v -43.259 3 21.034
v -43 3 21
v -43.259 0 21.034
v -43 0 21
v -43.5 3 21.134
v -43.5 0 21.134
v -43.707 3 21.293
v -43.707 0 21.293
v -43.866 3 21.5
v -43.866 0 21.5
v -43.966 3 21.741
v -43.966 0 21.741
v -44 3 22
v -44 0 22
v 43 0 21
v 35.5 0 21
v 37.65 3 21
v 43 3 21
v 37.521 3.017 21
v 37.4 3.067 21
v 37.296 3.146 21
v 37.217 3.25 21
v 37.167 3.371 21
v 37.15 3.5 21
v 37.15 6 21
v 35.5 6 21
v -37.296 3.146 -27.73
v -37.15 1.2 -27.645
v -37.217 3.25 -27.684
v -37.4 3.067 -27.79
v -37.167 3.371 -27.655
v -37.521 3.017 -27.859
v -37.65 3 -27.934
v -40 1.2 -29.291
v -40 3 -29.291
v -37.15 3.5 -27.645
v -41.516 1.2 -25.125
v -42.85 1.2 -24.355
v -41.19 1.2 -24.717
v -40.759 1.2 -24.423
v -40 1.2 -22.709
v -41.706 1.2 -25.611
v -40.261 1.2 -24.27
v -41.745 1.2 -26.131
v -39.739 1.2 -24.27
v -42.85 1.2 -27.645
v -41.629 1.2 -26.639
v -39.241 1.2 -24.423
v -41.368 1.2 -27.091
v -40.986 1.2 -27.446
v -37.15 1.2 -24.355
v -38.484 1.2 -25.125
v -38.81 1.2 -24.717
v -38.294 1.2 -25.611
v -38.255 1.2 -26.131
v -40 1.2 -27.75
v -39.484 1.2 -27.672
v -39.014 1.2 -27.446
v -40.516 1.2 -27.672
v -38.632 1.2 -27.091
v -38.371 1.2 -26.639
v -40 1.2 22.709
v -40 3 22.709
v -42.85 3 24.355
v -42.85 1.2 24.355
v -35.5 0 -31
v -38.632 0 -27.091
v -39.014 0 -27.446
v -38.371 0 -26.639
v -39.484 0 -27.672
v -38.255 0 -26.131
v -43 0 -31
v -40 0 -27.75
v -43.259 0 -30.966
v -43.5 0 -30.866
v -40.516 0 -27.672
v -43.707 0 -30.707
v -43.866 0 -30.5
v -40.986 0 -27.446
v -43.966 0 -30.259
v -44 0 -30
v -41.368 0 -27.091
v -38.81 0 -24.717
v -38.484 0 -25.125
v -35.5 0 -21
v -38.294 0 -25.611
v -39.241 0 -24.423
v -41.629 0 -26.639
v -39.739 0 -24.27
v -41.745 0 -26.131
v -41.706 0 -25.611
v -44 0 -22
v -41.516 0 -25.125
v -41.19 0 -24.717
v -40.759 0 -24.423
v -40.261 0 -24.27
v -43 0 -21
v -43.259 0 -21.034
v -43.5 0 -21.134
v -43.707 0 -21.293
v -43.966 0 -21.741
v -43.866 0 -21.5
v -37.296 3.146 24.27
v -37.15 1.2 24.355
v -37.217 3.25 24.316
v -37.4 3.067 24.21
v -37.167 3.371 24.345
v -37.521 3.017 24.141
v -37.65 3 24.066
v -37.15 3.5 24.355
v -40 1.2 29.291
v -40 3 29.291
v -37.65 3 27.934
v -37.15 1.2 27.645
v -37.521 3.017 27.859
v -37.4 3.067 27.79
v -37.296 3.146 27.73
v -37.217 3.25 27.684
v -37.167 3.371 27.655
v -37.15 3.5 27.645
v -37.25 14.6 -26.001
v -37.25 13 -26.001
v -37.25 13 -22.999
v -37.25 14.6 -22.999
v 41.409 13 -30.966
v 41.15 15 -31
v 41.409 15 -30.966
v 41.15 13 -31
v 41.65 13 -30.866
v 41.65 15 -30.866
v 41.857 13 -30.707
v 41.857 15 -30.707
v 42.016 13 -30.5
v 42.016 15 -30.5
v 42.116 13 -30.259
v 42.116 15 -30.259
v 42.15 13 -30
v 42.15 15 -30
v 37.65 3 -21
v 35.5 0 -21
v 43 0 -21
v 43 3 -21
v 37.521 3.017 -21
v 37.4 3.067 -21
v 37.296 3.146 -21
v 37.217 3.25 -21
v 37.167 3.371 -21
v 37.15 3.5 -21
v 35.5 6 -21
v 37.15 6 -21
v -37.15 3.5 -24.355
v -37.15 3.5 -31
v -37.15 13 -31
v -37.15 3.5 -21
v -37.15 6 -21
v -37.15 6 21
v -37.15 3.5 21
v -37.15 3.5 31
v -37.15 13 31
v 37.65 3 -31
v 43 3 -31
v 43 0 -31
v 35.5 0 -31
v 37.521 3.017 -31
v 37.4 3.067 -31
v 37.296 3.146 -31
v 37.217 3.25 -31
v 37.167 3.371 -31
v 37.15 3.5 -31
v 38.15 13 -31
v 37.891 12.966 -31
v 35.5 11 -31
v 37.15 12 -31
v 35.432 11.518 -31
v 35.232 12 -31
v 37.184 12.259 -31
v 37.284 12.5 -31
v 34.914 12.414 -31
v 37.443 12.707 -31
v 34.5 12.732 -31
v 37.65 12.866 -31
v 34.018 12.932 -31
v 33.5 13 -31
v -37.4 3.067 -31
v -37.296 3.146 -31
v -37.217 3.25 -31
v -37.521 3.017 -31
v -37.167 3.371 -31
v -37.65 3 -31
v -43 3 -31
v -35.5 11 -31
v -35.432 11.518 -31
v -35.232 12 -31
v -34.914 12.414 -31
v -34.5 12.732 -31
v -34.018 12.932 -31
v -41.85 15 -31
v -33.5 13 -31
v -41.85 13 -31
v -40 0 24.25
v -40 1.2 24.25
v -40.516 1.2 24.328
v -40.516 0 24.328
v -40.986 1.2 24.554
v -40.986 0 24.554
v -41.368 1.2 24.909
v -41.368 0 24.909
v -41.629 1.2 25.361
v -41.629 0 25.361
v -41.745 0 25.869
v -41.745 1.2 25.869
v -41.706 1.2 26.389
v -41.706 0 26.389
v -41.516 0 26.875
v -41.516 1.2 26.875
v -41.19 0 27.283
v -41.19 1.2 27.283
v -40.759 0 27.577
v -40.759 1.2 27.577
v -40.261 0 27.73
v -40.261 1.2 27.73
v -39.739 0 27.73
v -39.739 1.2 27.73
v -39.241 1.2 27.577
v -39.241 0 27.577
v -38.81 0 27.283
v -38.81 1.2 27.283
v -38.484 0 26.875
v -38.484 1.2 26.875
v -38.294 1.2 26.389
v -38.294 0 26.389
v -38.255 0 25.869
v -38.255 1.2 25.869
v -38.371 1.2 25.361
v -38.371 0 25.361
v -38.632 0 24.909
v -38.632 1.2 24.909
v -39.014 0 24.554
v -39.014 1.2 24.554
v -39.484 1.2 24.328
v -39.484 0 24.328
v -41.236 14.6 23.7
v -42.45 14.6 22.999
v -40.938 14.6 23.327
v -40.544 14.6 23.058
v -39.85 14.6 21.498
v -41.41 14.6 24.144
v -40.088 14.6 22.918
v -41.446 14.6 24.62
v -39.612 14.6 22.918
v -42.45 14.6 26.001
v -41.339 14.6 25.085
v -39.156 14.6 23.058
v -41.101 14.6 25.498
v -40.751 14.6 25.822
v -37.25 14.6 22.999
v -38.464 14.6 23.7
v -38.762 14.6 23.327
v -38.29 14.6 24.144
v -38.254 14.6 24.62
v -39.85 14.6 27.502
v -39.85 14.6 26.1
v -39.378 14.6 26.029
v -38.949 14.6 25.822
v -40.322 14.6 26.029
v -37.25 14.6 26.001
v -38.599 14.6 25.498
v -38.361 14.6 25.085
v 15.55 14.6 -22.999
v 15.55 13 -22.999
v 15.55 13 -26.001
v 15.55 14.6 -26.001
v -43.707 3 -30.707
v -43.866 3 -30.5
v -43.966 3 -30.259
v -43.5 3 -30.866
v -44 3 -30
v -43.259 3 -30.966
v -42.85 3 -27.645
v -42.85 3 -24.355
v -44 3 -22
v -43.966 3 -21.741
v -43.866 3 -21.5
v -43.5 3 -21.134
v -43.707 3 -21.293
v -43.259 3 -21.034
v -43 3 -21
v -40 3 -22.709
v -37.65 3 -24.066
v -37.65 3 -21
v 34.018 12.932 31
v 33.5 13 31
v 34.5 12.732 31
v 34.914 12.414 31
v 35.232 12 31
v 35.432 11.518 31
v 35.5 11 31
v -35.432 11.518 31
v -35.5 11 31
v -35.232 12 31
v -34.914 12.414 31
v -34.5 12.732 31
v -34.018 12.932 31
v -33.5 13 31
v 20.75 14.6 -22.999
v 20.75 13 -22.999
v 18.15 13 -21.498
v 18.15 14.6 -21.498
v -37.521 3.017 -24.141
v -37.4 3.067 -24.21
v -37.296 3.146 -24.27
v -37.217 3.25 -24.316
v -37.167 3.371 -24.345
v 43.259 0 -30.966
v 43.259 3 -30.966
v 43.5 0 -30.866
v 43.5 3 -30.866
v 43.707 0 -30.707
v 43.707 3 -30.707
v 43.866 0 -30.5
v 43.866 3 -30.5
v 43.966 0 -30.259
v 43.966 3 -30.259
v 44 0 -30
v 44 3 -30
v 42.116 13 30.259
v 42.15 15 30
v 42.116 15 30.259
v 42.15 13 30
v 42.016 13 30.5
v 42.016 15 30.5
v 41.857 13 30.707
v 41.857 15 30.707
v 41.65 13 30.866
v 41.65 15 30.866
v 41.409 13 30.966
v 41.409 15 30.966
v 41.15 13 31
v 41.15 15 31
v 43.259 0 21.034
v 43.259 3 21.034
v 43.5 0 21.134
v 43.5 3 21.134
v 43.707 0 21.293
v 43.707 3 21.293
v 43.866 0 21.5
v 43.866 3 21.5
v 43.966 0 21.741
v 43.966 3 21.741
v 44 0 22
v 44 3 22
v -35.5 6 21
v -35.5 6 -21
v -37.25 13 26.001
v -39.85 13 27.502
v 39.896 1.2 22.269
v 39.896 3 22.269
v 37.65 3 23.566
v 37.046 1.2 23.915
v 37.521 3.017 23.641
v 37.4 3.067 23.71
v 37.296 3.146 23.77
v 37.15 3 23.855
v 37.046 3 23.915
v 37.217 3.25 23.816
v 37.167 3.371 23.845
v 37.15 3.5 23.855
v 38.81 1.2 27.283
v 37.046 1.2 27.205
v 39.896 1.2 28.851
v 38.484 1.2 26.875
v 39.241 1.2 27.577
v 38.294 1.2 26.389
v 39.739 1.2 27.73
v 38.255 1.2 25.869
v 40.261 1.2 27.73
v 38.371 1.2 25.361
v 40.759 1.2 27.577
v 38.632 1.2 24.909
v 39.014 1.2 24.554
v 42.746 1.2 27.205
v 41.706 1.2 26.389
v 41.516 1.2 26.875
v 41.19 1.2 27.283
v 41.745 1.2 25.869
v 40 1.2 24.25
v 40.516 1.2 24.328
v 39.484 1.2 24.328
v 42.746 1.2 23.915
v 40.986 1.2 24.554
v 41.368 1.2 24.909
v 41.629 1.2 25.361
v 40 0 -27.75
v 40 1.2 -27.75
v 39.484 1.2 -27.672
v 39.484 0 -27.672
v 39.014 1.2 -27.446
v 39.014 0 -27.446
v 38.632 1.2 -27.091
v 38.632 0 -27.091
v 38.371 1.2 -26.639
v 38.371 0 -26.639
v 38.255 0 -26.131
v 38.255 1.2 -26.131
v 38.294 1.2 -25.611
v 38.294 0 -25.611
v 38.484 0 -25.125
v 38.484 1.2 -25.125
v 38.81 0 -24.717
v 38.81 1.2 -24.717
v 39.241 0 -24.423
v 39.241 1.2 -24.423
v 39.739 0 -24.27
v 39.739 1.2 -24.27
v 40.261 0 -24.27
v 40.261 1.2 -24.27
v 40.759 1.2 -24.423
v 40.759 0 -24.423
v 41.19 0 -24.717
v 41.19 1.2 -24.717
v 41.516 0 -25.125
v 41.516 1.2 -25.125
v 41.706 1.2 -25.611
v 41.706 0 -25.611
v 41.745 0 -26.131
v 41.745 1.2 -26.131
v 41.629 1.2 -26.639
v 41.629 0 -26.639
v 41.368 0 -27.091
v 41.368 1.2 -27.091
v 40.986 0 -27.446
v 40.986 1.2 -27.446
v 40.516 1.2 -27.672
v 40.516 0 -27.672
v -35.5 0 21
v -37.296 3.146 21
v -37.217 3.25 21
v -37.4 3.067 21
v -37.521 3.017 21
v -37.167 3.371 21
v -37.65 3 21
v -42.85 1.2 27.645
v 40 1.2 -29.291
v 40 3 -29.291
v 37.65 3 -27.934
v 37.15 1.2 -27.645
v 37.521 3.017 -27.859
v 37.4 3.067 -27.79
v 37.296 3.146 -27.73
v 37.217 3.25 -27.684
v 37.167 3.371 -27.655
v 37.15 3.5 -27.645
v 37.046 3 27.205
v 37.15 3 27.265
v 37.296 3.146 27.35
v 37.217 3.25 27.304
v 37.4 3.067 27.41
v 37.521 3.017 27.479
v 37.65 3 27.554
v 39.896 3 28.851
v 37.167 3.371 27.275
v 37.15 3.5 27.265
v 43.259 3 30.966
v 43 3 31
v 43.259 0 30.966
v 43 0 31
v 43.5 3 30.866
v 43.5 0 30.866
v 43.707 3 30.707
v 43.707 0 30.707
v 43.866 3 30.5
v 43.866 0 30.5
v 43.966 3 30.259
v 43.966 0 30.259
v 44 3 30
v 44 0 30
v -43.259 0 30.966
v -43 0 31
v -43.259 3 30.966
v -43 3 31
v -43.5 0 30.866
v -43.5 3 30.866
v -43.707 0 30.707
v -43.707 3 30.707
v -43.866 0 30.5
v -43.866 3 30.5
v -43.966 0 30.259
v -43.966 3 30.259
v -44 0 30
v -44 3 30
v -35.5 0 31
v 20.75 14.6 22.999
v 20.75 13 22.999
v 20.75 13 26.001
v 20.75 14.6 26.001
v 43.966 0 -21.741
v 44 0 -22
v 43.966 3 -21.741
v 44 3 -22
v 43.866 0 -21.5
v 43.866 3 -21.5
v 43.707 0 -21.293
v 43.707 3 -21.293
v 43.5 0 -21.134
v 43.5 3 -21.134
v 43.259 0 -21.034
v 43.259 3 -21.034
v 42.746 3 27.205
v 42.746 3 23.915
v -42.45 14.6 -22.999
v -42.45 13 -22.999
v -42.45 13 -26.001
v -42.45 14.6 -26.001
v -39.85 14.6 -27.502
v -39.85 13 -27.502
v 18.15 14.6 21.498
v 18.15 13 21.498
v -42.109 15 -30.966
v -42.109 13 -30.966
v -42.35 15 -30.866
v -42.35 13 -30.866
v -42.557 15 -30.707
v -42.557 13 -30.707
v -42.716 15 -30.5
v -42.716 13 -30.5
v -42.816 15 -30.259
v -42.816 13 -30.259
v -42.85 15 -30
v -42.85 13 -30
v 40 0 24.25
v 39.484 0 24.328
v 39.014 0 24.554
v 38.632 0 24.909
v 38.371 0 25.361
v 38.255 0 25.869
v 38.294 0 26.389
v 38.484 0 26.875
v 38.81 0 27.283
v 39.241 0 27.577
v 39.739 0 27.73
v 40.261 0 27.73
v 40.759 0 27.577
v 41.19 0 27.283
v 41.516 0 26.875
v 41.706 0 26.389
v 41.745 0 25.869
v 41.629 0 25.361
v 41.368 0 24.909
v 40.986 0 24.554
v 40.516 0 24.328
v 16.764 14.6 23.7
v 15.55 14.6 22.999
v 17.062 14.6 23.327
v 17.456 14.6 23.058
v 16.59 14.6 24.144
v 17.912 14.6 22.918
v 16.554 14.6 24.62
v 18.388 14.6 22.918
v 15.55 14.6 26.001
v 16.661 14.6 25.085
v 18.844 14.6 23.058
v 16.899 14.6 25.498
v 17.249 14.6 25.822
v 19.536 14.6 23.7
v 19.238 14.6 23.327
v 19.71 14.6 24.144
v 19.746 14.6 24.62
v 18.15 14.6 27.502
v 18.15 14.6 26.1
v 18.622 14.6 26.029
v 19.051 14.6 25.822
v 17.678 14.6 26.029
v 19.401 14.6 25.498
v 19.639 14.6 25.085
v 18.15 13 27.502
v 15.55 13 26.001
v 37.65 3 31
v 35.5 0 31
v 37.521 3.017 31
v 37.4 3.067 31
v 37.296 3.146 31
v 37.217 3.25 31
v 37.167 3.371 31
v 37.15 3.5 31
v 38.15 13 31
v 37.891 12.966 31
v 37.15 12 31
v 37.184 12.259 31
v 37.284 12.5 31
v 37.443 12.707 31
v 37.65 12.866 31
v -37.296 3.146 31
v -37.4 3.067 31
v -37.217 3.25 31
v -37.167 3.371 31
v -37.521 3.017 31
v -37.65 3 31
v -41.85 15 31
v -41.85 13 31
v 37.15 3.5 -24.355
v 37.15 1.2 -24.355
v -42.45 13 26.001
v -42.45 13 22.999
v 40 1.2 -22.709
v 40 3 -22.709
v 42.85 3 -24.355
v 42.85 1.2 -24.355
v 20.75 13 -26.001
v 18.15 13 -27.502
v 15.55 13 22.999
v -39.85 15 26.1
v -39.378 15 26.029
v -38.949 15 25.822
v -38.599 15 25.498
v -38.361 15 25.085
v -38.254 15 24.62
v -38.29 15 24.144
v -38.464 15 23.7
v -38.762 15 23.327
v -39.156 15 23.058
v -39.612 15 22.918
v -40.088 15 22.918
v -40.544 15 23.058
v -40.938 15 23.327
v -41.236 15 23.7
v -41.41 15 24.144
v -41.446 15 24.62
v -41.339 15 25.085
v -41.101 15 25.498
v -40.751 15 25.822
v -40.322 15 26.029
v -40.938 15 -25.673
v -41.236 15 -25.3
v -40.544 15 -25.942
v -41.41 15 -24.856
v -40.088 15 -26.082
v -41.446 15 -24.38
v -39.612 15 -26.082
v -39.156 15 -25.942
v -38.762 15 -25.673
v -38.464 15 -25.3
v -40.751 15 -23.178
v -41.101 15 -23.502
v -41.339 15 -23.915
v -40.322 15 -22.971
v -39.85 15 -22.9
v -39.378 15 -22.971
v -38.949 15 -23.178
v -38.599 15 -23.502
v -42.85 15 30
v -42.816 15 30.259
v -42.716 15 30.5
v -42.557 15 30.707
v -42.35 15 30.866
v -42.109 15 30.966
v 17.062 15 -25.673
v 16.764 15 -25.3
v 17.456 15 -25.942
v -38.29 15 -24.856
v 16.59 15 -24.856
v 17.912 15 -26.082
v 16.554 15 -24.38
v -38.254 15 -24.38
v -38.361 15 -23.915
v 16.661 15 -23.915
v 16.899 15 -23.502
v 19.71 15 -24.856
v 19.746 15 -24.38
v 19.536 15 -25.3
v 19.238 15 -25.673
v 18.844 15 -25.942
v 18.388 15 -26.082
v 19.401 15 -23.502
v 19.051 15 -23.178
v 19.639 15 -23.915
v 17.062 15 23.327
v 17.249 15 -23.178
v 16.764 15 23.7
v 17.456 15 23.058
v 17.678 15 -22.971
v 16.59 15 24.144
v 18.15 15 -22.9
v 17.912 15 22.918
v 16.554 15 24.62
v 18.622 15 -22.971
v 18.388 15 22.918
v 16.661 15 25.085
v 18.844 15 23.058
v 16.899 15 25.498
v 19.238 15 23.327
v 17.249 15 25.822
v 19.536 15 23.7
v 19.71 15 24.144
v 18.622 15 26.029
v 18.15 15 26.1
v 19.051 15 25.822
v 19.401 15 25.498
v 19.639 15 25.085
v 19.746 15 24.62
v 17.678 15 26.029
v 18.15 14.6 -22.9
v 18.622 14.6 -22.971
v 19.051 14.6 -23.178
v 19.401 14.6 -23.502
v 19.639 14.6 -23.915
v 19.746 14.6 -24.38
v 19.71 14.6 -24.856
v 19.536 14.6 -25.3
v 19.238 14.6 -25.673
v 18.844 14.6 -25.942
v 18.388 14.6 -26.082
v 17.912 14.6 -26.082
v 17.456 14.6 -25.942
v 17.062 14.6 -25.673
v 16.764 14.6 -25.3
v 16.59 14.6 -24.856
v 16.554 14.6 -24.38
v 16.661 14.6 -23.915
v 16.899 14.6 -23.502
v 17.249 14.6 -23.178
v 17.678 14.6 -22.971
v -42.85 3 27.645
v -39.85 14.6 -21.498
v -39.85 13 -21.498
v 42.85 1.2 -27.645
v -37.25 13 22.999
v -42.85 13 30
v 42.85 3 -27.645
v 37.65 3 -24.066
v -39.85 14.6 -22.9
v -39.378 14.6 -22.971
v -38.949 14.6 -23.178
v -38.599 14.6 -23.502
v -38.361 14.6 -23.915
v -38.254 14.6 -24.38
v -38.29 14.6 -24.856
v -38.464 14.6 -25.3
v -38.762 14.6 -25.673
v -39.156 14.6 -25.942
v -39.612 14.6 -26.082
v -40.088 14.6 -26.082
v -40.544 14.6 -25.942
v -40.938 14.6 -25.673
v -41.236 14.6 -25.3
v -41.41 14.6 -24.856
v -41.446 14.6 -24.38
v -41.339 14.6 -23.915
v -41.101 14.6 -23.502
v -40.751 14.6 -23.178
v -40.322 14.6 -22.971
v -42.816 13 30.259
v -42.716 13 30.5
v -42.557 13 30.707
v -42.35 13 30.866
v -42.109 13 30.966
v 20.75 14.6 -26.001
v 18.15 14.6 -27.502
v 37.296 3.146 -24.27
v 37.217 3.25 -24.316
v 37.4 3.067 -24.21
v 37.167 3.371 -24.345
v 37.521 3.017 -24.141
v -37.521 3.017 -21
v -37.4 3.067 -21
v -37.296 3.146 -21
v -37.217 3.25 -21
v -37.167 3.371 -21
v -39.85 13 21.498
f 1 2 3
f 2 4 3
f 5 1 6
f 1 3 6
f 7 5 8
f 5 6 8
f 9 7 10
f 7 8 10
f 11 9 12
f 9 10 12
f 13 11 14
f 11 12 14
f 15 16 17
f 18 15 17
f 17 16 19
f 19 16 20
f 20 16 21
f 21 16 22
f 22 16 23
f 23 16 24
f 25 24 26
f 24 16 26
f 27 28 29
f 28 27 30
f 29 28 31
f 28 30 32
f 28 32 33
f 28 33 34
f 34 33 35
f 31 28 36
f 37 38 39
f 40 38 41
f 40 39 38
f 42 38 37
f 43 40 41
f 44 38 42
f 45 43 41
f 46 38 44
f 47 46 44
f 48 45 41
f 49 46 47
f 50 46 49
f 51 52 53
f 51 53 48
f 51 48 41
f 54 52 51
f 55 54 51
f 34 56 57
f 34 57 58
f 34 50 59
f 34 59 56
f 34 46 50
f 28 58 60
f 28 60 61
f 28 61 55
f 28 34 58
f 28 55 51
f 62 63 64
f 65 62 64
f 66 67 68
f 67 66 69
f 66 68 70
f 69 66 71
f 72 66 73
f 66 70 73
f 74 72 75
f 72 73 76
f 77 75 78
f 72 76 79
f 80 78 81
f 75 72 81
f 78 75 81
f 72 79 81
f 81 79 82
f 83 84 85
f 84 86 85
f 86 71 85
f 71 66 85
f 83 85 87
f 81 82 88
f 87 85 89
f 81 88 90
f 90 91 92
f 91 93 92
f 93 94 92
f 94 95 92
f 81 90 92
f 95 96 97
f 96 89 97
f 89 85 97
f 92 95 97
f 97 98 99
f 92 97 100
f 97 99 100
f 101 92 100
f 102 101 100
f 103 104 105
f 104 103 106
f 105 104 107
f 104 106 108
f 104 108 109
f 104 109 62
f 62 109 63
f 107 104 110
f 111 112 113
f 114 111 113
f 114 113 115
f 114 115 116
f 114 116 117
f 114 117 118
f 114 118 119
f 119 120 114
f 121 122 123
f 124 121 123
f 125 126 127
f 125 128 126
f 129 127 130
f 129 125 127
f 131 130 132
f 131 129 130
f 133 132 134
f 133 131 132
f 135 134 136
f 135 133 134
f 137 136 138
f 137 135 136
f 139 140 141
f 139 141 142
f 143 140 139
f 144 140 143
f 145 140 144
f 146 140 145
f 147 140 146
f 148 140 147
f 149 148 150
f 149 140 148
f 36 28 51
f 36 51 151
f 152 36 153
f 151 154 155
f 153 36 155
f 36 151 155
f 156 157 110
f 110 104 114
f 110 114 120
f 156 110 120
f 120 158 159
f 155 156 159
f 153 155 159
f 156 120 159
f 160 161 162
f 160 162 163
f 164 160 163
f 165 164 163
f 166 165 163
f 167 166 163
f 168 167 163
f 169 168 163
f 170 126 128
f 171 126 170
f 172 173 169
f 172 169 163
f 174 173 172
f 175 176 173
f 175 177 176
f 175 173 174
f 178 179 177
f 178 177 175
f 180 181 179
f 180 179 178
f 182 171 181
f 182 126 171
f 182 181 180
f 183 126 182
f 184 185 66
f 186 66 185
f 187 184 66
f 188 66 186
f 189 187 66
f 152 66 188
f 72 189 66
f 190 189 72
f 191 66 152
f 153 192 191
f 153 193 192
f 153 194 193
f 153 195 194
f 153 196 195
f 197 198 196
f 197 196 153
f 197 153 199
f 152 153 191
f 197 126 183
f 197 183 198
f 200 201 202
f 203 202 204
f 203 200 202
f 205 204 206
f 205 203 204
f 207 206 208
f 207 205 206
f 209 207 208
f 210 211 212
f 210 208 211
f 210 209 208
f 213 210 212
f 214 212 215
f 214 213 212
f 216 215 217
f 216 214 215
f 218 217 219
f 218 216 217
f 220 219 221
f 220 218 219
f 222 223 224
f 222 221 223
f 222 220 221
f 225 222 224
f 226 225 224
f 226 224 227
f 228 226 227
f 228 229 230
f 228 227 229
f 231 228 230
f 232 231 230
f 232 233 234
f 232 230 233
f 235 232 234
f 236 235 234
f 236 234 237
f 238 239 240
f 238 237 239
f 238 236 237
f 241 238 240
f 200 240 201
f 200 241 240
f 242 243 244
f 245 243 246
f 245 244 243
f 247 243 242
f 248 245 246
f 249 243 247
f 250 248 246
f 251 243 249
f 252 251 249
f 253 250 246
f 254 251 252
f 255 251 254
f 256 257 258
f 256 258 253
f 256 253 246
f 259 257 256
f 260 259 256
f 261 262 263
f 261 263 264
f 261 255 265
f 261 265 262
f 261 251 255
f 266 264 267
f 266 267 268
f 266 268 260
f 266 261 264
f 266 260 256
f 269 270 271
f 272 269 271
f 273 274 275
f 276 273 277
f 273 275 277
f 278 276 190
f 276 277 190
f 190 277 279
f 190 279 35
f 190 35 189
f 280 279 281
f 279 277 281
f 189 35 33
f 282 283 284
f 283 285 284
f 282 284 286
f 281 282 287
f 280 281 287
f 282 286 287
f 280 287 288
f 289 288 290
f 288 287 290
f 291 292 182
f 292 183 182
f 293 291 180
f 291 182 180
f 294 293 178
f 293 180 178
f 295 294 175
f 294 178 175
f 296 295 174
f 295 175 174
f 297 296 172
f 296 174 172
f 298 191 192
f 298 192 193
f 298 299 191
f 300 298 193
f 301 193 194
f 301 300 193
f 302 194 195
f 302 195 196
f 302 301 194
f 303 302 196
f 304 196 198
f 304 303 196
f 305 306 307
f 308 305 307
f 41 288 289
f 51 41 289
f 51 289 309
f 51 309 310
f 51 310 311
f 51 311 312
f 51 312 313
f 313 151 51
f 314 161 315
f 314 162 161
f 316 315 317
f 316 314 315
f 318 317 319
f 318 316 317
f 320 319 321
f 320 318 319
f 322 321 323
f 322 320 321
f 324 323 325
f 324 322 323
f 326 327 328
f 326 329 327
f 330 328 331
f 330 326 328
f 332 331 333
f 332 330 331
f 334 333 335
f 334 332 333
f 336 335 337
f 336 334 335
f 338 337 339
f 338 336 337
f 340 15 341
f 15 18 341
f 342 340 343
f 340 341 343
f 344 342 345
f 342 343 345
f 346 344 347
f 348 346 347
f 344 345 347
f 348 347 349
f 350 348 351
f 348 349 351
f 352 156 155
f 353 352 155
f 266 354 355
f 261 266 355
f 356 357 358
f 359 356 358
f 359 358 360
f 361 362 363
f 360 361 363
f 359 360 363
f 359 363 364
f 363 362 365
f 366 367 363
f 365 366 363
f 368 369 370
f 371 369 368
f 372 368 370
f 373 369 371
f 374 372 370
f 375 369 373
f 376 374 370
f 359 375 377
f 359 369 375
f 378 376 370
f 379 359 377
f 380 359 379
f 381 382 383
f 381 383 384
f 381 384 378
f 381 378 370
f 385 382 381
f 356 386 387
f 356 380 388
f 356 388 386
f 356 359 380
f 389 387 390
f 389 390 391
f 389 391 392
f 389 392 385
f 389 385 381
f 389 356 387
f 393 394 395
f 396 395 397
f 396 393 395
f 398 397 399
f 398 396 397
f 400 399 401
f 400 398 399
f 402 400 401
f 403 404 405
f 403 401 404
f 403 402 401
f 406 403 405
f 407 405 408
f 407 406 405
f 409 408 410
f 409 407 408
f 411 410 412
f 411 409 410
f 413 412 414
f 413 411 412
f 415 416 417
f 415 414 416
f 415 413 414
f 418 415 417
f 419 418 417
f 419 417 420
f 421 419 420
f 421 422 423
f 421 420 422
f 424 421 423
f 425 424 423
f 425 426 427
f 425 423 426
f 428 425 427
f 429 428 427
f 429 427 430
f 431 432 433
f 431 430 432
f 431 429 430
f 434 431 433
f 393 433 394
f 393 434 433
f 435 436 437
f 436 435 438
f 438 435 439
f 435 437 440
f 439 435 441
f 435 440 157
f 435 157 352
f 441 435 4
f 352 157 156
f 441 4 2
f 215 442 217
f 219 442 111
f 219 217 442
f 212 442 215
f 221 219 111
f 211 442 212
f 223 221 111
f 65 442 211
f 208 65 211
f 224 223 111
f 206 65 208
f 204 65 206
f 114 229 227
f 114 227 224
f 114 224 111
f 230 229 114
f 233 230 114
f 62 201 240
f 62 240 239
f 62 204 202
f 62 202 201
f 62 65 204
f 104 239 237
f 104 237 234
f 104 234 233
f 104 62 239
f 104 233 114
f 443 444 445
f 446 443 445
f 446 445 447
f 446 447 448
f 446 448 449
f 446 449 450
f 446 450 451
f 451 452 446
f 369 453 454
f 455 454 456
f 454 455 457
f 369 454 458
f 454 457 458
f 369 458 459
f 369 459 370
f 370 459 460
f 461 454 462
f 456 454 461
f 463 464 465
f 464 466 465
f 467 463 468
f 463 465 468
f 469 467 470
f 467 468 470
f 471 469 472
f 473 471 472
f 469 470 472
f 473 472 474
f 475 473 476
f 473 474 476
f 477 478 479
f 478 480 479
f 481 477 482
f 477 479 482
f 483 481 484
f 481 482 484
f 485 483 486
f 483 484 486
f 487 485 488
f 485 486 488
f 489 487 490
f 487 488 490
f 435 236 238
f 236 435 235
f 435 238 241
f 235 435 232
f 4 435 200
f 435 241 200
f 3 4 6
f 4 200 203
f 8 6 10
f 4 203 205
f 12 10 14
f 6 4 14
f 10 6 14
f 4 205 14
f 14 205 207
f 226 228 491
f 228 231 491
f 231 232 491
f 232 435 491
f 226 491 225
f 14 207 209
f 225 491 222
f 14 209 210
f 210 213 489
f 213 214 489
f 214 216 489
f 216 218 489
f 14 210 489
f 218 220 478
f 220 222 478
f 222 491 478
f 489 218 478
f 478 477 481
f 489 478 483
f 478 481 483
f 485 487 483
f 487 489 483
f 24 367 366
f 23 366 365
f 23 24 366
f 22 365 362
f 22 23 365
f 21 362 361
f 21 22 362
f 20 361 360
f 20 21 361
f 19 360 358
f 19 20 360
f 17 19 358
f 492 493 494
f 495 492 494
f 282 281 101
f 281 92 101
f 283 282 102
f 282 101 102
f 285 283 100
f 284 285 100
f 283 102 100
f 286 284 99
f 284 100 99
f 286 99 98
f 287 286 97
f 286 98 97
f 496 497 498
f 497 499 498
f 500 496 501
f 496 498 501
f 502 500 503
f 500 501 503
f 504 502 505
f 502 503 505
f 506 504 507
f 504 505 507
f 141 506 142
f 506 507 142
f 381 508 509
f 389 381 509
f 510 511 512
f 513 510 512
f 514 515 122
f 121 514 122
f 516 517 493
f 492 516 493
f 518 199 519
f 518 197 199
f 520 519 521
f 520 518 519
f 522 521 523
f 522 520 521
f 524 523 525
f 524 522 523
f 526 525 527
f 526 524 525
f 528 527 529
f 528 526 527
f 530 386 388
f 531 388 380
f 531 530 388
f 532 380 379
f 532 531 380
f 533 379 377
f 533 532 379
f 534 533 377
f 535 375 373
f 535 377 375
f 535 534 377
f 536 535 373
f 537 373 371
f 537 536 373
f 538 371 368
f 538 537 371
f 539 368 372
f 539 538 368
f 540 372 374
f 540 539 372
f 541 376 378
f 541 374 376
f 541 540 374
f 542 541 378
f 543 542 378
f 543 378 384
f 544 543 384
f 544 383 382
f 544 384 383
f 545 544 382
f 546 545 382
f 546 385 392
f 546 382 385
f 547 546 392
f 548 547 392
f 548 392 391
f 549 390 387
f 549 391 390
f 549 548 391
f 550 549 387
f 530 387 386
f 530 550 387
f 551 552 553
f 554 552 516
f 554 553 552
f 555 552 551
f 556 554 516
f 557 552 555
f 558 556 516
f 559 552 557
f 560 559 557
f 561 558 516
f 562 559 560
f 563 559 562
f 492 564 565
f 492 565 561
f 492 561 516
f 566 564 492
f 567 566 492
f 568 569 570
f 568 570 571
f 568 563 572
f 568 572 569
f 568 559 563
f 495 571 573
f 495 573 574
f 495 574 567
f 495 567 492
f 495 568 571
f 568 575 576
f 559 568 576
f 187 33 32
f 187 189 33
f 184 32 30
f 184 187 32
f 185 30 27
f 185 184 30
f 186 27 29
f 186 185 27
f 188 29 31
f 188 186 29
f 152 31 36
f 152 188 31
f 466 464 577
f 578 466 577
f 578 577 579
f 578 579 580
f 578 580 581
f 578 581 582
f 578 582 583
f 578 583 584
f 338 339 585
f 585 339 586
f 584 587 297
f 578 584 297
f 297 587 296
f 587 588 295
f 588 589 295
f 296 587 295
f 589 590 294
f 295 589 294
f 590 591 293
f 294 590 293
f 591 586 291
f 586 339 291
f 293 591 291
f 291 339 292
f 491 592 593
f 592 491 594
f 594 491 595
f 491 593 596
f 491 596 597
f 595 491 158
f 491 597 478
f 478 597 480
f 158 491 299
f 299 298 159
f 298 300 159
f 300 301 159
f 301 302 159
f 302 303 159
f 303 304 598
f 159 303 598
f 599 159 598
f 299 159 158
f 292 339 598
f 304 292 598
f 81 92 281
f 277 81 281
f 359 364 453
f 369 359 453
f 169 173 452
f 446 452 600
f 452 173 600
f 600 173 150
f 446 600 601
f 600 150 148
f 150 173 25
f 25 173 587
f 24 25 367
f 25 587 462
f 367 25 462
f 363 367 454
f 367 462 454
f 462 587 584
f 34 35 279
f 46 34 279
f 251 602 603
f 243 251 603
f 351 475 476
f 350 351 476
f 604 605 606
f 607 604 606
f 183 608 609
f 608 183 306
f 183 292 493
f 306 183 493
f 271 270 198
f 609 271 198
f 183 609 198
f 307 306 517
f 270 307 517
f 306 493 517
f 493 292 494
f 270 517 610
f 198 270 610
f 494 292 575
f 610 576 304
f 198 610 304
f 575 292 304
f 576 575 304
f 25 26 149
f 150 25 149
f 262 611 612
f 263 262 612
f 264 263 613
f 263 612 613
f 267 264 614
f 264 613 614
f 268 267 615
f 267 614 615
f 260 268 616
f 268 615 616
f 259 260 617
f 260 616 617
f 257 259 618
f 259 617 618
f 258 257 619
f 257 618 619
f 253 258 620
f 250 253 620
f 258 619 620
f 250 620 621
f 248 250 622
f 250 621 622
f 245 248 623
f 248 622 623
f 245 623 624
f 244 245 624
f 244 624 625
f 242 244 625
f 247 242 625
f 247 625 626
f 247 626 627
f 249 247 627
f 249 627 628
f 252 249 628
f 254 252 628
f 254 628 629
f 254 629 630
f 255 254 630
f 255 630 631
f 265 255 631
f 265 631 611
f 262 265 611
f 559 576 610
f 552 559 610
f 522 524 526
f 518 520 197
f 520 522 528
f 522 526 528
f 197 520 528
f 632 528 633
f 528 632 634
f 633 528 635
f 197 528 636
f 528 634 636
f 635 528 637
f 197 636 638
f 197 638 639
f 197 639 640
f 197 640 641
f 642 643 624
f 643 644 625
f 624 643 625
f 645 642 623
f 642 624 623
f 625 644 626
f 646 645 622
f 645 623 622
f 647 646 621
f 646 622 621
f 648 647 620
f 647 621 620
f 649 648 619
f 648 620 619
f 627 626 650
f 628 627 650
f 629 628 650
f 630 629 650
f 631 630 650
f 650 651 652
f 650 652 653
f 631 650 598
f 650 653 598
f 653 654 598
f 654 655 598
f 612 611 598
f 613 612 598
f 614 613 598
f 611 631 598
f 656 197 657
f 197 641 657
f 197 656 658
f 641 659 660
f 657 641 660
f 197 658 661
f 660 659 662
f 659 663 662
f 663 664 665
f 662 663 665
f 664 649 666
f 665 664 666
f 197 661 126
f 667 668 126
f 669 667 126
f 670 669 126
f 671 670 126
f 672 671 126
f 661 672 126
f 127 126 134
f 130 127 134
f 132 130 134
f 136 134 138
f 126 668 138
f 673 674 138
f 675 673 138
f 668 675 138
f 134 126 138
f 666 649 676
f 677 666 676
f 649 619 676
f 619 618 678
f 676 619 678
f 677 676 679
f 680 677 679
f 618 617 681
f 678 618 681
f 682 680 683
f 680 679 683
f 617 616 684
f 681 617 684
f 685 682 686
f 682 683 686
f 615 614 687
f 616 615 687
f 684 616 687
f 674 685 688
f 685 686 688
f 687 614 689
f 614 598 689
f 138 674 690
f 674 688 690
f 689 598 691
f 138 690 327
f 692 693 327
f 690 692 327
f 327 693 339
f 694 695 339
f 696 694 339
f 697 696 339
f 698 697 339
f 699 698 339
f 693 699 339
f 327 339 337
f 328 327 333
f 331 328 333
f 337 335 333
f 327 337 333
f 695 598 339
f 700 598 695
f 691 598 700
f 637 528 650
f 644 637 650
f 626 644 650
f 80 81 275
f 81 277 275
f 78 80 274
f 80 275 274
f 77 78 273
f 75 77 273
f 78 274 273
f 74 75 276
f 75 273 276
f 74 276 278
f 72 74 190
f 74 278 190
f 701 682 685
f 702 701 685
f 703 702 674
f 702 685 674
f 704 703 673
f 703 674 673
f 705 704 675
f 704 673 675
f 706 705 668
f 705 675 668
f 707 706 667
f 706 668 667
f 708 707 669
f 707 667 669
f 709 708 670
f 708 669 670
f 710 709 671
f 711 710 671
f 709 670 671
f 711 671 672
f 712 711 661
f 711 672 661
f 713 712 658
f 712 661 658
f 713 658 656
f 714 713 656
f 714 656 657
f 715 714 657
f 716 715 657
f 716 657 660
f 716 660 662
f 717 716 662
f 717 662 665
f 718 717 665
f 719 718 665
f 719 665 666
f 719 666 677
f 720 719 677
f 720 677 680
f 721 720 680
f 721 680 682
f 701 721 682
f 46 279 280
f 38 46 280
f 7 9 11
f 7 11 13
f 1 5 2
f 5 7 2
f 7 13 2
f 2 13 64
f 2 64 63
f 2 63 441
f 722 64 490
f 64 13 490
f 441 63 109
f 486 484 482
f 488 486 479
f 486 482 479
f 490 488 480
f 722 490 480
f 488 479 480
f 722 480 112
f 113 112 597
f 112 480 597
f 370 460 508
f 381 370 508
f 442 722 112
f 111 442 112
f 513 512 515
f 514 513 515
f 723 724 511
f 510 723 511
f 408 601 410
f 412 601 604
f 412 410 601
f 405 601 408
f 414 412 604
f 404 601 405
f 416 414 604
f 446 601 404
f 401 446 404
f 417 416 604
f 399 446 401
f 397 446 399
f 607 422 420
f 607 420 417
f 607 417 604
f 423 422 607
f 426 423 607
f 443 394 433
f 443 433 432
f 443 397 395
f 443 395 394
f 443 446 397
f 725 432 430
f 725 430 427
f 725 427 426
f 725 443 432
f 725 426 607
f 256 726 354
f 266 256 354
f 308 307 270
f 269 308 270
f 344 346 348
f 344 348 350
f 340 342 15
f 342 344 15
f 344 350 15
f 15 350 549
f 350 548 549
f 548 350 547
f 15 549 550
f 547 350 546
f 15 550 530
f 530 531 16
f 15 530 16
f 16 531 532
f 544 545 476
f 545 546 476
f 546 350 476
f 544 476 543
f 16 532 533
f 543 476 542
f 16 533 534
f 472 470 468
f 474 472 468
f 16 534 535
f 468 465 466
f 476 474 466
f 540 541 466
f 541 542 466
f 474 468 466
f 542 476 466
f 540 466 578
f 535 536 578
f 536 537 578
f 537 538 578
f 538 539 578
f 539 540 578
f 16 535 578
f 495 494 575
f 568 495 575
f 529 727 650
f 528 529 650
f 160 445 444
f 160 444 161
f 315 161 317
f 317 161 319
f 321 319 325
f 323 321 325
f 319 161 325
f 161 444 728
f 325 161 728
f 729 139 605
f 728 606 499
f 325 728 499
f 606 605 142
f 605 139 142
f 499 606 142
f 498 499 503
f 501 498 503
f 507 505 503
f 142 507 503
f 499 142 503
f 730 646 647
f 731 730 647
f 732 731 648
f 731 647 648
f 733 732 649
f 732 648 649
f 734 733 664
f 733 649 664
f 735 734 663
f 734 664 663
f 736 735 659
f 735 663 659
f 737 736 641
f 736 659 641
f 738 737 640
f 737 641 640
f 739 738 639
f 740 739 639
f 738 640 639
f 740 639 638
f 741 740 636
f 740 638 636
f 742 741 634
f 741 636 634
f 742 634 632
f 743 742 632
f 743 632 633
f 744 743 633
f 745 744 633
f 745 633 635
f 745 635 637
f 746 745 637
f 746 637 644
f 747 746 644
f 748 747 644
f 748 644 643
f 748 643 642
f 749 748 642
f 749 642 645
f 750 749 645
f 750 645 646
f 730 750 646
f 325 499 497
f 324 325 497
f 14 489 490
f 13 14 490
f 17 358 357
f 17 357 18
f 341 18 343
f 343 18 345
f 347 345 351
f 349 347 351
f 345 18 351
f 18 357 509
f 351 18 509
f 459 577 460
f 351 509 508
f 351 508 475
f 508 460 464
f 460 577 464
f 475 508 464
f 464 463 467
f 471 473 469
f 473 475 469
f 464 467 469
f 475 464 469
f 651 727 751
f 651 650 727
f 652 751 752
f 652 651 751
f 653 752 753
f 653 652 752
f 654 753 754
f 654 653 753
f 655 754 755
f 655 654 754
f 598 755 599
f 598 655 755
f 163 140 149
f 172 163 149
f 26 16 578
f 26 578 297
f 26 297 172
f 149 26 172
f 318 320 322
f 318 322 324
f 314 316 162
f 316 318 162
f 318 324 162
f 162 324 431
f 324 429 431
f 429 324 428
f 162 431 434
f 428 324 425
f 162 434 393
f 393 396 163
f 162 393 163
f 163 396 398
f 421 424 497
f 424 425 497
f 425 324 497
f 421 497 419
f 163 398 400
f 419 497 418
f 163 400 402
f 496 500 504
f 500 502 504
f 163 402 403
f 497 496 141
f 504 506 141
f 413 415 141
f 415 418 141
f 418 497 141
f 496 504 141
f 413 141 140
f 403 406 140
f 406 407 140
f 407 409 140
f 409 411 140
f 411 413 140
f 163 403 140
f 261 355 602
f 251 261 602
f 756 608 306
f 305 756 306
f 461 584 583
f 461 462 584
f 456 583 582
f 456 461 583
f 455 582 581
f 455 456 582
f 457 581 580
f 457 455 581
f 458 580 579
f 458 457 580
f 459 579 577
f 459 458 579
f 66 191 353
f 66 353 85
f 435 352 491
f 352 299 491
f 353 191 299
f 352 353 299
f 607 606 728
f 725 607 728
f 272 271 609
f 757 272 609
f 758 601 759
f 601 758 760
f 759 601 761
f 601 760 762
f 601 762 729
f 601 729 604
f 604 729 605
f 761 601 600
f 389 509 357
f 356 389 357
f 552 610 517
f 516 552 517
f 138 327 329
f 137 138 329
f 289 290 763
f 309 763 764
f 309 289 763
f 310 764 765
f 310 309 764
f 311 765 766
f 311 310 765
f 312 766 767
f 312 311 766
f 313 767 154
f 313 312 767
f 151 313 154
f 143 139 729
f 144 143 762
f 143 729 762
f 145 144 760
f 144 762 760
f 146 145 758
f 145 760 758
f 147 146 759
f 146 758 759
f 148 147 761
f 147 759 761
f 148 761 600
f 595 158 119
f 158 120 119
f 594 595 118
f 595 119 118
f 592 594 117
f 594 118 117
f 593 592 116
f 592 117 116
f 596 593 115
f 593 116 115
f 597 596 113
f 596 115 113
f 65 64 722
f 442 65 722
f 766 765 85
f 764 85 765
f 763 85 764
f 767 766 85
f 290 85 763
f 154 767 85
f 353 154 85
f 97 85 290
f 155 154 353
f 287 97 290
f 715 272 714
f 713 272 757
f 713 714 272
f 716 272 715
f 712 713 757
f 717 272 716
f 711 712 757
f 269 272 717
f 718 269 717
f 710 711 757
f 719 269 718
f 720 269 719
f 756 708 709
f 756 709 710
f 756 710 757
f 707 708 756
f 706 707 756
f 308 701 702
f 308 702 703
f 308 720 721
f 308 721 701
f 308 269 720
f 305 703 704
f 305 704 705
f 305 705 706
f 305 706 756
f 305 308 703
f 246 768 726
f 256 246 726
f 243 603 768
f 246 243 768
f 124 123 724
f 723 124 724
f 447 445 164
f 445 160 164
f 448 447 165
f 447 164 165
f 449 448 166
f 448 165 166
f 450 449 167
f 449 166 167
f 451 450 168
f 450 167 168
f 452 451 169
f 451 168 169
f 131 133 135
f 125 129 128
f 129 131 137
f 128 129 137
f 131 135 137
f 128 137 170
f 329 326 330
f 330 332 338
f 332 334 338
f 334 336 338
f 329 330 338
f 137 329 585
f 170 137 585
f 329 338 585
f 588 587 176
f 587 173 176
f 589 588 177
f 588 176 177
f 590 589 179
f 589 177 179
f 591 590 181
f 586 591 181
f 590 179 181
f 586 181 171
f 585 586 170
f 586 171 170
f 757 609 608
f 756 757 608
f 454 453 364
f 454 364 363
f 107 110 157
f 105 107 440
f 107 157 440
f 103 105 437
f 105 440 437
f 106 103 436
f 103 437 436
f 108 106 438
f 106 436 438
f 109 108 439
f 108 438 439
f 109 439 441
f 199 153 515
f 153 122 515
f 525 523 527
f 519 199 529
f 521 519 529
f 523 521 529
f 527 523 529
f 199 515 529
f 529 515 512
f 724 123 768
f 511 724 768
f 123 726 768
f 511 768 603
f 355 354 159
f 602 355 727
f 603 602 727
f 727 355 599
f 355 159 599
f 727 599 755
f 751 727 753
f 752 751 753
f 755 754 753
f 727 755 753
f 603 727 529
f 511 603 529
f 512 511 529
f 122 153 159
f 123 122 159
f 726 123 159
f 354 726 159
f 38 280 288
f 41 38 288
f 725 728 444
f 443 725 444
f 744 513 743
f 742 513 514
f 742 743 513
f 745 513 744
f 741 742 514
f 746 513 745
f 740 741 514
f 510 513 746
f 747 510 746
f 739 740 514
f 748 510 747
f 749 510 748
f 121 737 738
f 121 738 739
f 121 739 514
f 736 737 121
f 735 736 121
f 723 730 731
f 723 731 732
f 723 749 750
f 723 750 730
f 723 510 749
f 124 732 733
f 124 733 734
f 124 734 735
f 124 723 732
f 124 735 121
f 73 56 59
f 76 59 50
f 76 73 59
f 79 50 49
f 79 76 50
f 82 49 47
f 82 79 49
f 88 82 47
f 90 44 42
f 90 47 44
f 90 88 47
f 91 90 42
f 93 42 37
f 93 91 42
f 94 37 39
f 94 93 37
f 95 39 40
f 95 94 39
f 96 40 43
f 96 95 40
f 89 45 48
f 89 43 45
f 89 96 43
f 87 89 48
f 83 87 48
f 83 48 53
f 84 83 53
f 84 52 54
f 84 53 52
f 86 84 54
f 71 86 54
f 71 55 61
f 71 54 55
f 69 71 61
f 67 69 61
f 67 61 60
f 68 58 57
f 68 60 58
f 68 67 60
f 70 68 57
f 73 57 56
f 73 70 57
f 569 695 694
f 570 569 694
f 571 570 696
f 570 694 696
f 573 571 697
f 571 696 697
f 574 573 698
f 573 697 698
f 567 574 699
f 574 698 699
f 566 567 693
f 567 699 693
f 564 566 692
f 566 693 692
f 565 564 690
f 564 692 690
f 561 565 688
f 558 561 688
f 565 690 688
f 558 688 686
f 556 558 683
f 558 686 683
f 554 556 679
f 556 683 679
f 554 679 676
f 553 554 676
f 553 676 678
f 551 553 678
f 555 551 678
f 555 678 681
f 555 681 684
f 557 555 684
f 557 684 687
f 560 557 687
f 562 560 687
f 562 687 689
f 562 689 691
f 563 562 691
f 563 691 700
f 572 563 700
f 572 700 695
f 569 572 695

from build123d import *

# Parameters (mm, degrees)
EXTRUDE_1_DEPTH          = 31
CUT_EXTRUDE_1_DEPTH      = 56.874860179
CUT_EXTRUDE_1_DEPTH_BACK = 56.874860179
SKETCH_2_W               = 42
SKETCH_2_H               = 12
CUT_EXTRUDE_3_REACH      = 57.875
SKETCH_3_R               = 1.75
SKETCH_5_R               = 1.6
CUT_EXTRUDE_5_DEPTH      = 5
CUT_EXTRUDE_8_DEPTH      = 1.6
FILLET_1_R               = 1
FILLET_7_R               = 2
CUT_EXTRUDE_9_DEPTH      = 1.8
FILLET_5_R               = 0.5
FILLET_8_R               = 1


with BuildPart() as part:
    # 草圖1 → 填料-伸長1 (new, symmetric)
    with BuildSketch(Plane.XY):
        Polygon((-44, 0), (-44, 3), (-37.15, 3), (-37.15, 13), (-42.85, 13), (-42.85, 15), (42.15, 15), (42.15, 13), (37.15, 13), (37.15, 3), (44, 3), (44, 0), (35.5, 0), (35.5, 13), (-35.5, 13), (-35.5, 0), align=None)
    extrude(amount=EXTRUDE_1_DEPTH, both=True)

    # 草圖2 → 除料-伸長1 (cut, two sides: drawn at the far end of the back side and taken through both)
    with BuildSketch(Plane(origin=(0, 0, 0), x_dir=(0, 0, -1), z_dir=(1, 0, 0)).offset(-CUT_EXTRUDE_1_DEPTH_BACK)):
        Rectangle(SKETCH_2_W, SKETCH_2_H)
    extrude(amount=CUT_EXTRUDE_1_DEPTH + CUT_EXTRUDE_1_DEPTH_BACK, mode=Mode.SUBTRACT)

    # 草圖3 → 除料-伸長3 (cut, up to next)
    with BuildSketch(Plane(origin=(0, 0, 0), x_dir=(1, 0, 0), z_dir=(0, 1, 0)), mode=Mode.PRIVATE) as cut_extrude_3_sk1:
        with Locations(Location((-40, 26, 0), (0, 0, 90))):
            Circle(SKETCH_3_R)
    cut_extrude_3_tool1 = extrude(cut_extrude_3_sk1.sketch, amount=CUT_EXTRUDE_3_REACH, mode=Mode.PRIVATE) & part.part
    # 草圖3 → 除料-伸長3 (cut, up to next)
    with BuildSketch(Plane(origin=(0, 0, 0), x_dir=(1, 0, 0), z_dir=(0, 1, 0)), mode=Mode.PRIVATE) as cut_extrude_3_sk2:
        with Locations(Location((40, 26, 0), (0, 0, 90))):
            Circle(SKETCH_3_R)
    cut_extrude_3_tool2 = extrude(cut_extrude_3_sk2.sketch, amount=CUT_EXTRUDE_3_REACH, mode=Mode.PRIVATE) & part.part
    # 草圖3 → 除料-伸長3 (cut, up to next)
    with BuildSketch(Plane(origin=(0, 0, 0), x_dir=(1, 0, 0), z_dir=(0, 1, 0)), mode=Mode.PRIVATE) as cut_extrude_3_sk3:
        with Locations(Location((40, -26, 0), (0, 0, 90))):
            Circle(SKETCH_3_R)
    cut_extrude_3_tool3 = extrude(cut_extrude_3_sk3.sketch, amount=CUT_EXTRUDE_3_REACH, mode=Mode.PRIVATE) & part.part
    # 草圖3 → 除料-伸長3 (cut, up to next)
    with BuildSketch(Plane(origin=(0, 0, 0), x_dir=(1, 0, 0), z_dir=(0, 1, 0)), mode=Mode.PRIVATE) as cut_extrude_3_sk4:
        with Locations(Location((-40, -26, 0), (0, 0, 90))):
            Circle(SKETCH_3_R)
    cut_extrude_3_tool4 = extrude(cut_extrude_3_sk4.sketch, amount=CUT_EXTRUDE_3_REACH, mode=Mode.PRIVATE) & part.part
    add(cut_extrude_3_tool1.solids().sort_by_distance((-40, 0, -26))[0], mode=Mode.SUBTRACT)
    add(cut_extrude_3_tool2.solids().sort_by_distance((40, 0, -26))[0], mode=Mode.SUBTRACT)
    add(cut_extrude_3_tool3.solids().sort_by_distance((40, 0, 26))[0], mode=Mode.SUBTRACT)
    add(cut_extrude_3_tool4.solids().sort_by_distance((-40, 0, 26))[0], mode=Mode.SUBTRACT)

    # 草圖5 → 除料-伸長5 (cut)
    with BuildSketch(Plane(origin=(0, 15, 0), x_dir=(1, 0, 0), z_dir=(0, 1, 0))):
        with Locations(Location((-39.85, 24.5, 0), (0, 0, 270))):
            Circle(SKETCH_5_R)
        with Locations(Location((-39.85, -24.5, 0), (0, 0, 270))):
            Circle(SKETCH_5_R)
        with Locations(Location((18.15, 24.5, 0), (0, 0, 270))):
            Circle(SKETCH_5_R)
        with Locations(Location((18.15, -24.5, 0), (0, 0, 270))):
            Circle(SKETCH_5_R)
    extrude(amount=-CUT_EXTRUDE_5_DEPTH, mode=Mode.SUBTRACT)

    # 草圖17 → 除料-伸長8 (cut)
    with BuildSketch(Plane.XZ.offset(-13)):
        Polygon((20.75, 22.9988893), (20.75, 26.0011107), (18.15, 27.5022214), (15.55, 26.0011107), (15.55, 22.9988893), (18.15, 21.4977786), align=None)
        Polygon((20.75, -26.0011107), (20.75, -22.9988893), (18.15, -21.4977786), (15.55, -22.9988893), (15.55, -26.0011107), (18.15, -27.5022214), align=None)
        Polygon((-39.85, 21.4977786), (-37.25, 22.9988893), (-37.25, 26.0011107), (-39.85, 27.5022214), (-42.45, 26.0011107), (-42.45, 22.9988893), align=None)
        Polygon((-39.85, -27.5022214), (-37.25, -26.0011107), (-37.25, -22.9988893), (-39.85, -21.4977786), (-42.45, -22.9988893), (-42.45, -26.0011107), align=None)
    extrude(amount=-CUT_EXTRUDE_8_DEPTH, mode=Mode.SUBTRACT)

    # 圓角1
    fillet_1_edges = [part.edges().sort_by_distance(p)[0] for p in [
        (-44, 1.5, -31),
        (-42.85, 14, -31),
        (42.15, 14, -31),
        (44, 1.5, -31),
        (44, 1.5, 31),
        (42.15, 14, 31),
        (-44, 1.5, 21),
        (-44, 1.5, -21),
        (-42.85, 14, 31),
        (44, 1.5, -21),
        (44, 1.5, 21),
        (-44, 1.5, 31),
    ]]
    fillet(fillet_1_edges, radius=FILLET_1_R)

    # 圓角7
    fillet_7_edges = [part.edges().sort_by_distance(p)[0] for p in [
        (35.5, 13, 0),
        (-35.5, 13, 0),
    ]]
    fillet(fillet_7_edges, radius=FILLET_7_R)

    # 草圖19 → 除料-伸長9 (cut)
    with BuildSketch(Plane(origin=(0, 3, 0), x_dir=(1, 0, 0), z_dir=(0, 1, 0))):
        Polygon((-40, -29.290896534), (-37.15, -27.645448267), (-37.15, -24.354551733), (-40, -22.709103466), (-42.85, -24.354551733), (-42.85, -27.645448267), align=None)
        Polygon((39.896071136, -28.850899892), (42.746071136, -27.205451625), (42.746071136, -23.91455509), (39.896071136, -22.269106823), (37.046071136, -23.91455509), (37.046071136, -27.205451625), align=None)
        Polygon((42.85, 24.354551733), (42.85, 27.645448267), (40, 29.290896534), (37.15, 27.645448267), (37.15, 24.354551733), (40, 22.709103466), align=None)
        Polygon((-40, 22.709103466), (-37.15, 24.354551733), (-37.15, 27.645448267), (-40, 29.290896534), (-42.85, 27.645448267), (-42.85, 24.354551733), align=None)
    extrude(amount=-CUT_EXTRUDE_9_DEPTH, mode=Mode.SUBTRACT)

    # 圓角5
    fillet_5_edges = [part.edges().sort_by_distance(p)[0] for p in [
        (-37.15, 3, 29.322724134),
        (37.15, 3, 29.132727491),
        (-37.15, 3, 22.677275866),
        (-37.15, 3, -29.322724134),
        (37.15, 3, -29.322724134),
        (37.15, 3, 22.427275866),
        (-37.15, 3, -22.677275866),
        (37.15, 3, -22.677275866),
    ]]
    fillet(fillet_5_edges, radius=FILLET_5_R)

    # 圓角8
    fillet_8_edges = [part.edges().sort_by_distance(p)[0] for p in [
        (37.15, 13, 0),
    ]]
    fillet(fillet_8_edges, radius=FILLET_8_R)


solid = part.part
